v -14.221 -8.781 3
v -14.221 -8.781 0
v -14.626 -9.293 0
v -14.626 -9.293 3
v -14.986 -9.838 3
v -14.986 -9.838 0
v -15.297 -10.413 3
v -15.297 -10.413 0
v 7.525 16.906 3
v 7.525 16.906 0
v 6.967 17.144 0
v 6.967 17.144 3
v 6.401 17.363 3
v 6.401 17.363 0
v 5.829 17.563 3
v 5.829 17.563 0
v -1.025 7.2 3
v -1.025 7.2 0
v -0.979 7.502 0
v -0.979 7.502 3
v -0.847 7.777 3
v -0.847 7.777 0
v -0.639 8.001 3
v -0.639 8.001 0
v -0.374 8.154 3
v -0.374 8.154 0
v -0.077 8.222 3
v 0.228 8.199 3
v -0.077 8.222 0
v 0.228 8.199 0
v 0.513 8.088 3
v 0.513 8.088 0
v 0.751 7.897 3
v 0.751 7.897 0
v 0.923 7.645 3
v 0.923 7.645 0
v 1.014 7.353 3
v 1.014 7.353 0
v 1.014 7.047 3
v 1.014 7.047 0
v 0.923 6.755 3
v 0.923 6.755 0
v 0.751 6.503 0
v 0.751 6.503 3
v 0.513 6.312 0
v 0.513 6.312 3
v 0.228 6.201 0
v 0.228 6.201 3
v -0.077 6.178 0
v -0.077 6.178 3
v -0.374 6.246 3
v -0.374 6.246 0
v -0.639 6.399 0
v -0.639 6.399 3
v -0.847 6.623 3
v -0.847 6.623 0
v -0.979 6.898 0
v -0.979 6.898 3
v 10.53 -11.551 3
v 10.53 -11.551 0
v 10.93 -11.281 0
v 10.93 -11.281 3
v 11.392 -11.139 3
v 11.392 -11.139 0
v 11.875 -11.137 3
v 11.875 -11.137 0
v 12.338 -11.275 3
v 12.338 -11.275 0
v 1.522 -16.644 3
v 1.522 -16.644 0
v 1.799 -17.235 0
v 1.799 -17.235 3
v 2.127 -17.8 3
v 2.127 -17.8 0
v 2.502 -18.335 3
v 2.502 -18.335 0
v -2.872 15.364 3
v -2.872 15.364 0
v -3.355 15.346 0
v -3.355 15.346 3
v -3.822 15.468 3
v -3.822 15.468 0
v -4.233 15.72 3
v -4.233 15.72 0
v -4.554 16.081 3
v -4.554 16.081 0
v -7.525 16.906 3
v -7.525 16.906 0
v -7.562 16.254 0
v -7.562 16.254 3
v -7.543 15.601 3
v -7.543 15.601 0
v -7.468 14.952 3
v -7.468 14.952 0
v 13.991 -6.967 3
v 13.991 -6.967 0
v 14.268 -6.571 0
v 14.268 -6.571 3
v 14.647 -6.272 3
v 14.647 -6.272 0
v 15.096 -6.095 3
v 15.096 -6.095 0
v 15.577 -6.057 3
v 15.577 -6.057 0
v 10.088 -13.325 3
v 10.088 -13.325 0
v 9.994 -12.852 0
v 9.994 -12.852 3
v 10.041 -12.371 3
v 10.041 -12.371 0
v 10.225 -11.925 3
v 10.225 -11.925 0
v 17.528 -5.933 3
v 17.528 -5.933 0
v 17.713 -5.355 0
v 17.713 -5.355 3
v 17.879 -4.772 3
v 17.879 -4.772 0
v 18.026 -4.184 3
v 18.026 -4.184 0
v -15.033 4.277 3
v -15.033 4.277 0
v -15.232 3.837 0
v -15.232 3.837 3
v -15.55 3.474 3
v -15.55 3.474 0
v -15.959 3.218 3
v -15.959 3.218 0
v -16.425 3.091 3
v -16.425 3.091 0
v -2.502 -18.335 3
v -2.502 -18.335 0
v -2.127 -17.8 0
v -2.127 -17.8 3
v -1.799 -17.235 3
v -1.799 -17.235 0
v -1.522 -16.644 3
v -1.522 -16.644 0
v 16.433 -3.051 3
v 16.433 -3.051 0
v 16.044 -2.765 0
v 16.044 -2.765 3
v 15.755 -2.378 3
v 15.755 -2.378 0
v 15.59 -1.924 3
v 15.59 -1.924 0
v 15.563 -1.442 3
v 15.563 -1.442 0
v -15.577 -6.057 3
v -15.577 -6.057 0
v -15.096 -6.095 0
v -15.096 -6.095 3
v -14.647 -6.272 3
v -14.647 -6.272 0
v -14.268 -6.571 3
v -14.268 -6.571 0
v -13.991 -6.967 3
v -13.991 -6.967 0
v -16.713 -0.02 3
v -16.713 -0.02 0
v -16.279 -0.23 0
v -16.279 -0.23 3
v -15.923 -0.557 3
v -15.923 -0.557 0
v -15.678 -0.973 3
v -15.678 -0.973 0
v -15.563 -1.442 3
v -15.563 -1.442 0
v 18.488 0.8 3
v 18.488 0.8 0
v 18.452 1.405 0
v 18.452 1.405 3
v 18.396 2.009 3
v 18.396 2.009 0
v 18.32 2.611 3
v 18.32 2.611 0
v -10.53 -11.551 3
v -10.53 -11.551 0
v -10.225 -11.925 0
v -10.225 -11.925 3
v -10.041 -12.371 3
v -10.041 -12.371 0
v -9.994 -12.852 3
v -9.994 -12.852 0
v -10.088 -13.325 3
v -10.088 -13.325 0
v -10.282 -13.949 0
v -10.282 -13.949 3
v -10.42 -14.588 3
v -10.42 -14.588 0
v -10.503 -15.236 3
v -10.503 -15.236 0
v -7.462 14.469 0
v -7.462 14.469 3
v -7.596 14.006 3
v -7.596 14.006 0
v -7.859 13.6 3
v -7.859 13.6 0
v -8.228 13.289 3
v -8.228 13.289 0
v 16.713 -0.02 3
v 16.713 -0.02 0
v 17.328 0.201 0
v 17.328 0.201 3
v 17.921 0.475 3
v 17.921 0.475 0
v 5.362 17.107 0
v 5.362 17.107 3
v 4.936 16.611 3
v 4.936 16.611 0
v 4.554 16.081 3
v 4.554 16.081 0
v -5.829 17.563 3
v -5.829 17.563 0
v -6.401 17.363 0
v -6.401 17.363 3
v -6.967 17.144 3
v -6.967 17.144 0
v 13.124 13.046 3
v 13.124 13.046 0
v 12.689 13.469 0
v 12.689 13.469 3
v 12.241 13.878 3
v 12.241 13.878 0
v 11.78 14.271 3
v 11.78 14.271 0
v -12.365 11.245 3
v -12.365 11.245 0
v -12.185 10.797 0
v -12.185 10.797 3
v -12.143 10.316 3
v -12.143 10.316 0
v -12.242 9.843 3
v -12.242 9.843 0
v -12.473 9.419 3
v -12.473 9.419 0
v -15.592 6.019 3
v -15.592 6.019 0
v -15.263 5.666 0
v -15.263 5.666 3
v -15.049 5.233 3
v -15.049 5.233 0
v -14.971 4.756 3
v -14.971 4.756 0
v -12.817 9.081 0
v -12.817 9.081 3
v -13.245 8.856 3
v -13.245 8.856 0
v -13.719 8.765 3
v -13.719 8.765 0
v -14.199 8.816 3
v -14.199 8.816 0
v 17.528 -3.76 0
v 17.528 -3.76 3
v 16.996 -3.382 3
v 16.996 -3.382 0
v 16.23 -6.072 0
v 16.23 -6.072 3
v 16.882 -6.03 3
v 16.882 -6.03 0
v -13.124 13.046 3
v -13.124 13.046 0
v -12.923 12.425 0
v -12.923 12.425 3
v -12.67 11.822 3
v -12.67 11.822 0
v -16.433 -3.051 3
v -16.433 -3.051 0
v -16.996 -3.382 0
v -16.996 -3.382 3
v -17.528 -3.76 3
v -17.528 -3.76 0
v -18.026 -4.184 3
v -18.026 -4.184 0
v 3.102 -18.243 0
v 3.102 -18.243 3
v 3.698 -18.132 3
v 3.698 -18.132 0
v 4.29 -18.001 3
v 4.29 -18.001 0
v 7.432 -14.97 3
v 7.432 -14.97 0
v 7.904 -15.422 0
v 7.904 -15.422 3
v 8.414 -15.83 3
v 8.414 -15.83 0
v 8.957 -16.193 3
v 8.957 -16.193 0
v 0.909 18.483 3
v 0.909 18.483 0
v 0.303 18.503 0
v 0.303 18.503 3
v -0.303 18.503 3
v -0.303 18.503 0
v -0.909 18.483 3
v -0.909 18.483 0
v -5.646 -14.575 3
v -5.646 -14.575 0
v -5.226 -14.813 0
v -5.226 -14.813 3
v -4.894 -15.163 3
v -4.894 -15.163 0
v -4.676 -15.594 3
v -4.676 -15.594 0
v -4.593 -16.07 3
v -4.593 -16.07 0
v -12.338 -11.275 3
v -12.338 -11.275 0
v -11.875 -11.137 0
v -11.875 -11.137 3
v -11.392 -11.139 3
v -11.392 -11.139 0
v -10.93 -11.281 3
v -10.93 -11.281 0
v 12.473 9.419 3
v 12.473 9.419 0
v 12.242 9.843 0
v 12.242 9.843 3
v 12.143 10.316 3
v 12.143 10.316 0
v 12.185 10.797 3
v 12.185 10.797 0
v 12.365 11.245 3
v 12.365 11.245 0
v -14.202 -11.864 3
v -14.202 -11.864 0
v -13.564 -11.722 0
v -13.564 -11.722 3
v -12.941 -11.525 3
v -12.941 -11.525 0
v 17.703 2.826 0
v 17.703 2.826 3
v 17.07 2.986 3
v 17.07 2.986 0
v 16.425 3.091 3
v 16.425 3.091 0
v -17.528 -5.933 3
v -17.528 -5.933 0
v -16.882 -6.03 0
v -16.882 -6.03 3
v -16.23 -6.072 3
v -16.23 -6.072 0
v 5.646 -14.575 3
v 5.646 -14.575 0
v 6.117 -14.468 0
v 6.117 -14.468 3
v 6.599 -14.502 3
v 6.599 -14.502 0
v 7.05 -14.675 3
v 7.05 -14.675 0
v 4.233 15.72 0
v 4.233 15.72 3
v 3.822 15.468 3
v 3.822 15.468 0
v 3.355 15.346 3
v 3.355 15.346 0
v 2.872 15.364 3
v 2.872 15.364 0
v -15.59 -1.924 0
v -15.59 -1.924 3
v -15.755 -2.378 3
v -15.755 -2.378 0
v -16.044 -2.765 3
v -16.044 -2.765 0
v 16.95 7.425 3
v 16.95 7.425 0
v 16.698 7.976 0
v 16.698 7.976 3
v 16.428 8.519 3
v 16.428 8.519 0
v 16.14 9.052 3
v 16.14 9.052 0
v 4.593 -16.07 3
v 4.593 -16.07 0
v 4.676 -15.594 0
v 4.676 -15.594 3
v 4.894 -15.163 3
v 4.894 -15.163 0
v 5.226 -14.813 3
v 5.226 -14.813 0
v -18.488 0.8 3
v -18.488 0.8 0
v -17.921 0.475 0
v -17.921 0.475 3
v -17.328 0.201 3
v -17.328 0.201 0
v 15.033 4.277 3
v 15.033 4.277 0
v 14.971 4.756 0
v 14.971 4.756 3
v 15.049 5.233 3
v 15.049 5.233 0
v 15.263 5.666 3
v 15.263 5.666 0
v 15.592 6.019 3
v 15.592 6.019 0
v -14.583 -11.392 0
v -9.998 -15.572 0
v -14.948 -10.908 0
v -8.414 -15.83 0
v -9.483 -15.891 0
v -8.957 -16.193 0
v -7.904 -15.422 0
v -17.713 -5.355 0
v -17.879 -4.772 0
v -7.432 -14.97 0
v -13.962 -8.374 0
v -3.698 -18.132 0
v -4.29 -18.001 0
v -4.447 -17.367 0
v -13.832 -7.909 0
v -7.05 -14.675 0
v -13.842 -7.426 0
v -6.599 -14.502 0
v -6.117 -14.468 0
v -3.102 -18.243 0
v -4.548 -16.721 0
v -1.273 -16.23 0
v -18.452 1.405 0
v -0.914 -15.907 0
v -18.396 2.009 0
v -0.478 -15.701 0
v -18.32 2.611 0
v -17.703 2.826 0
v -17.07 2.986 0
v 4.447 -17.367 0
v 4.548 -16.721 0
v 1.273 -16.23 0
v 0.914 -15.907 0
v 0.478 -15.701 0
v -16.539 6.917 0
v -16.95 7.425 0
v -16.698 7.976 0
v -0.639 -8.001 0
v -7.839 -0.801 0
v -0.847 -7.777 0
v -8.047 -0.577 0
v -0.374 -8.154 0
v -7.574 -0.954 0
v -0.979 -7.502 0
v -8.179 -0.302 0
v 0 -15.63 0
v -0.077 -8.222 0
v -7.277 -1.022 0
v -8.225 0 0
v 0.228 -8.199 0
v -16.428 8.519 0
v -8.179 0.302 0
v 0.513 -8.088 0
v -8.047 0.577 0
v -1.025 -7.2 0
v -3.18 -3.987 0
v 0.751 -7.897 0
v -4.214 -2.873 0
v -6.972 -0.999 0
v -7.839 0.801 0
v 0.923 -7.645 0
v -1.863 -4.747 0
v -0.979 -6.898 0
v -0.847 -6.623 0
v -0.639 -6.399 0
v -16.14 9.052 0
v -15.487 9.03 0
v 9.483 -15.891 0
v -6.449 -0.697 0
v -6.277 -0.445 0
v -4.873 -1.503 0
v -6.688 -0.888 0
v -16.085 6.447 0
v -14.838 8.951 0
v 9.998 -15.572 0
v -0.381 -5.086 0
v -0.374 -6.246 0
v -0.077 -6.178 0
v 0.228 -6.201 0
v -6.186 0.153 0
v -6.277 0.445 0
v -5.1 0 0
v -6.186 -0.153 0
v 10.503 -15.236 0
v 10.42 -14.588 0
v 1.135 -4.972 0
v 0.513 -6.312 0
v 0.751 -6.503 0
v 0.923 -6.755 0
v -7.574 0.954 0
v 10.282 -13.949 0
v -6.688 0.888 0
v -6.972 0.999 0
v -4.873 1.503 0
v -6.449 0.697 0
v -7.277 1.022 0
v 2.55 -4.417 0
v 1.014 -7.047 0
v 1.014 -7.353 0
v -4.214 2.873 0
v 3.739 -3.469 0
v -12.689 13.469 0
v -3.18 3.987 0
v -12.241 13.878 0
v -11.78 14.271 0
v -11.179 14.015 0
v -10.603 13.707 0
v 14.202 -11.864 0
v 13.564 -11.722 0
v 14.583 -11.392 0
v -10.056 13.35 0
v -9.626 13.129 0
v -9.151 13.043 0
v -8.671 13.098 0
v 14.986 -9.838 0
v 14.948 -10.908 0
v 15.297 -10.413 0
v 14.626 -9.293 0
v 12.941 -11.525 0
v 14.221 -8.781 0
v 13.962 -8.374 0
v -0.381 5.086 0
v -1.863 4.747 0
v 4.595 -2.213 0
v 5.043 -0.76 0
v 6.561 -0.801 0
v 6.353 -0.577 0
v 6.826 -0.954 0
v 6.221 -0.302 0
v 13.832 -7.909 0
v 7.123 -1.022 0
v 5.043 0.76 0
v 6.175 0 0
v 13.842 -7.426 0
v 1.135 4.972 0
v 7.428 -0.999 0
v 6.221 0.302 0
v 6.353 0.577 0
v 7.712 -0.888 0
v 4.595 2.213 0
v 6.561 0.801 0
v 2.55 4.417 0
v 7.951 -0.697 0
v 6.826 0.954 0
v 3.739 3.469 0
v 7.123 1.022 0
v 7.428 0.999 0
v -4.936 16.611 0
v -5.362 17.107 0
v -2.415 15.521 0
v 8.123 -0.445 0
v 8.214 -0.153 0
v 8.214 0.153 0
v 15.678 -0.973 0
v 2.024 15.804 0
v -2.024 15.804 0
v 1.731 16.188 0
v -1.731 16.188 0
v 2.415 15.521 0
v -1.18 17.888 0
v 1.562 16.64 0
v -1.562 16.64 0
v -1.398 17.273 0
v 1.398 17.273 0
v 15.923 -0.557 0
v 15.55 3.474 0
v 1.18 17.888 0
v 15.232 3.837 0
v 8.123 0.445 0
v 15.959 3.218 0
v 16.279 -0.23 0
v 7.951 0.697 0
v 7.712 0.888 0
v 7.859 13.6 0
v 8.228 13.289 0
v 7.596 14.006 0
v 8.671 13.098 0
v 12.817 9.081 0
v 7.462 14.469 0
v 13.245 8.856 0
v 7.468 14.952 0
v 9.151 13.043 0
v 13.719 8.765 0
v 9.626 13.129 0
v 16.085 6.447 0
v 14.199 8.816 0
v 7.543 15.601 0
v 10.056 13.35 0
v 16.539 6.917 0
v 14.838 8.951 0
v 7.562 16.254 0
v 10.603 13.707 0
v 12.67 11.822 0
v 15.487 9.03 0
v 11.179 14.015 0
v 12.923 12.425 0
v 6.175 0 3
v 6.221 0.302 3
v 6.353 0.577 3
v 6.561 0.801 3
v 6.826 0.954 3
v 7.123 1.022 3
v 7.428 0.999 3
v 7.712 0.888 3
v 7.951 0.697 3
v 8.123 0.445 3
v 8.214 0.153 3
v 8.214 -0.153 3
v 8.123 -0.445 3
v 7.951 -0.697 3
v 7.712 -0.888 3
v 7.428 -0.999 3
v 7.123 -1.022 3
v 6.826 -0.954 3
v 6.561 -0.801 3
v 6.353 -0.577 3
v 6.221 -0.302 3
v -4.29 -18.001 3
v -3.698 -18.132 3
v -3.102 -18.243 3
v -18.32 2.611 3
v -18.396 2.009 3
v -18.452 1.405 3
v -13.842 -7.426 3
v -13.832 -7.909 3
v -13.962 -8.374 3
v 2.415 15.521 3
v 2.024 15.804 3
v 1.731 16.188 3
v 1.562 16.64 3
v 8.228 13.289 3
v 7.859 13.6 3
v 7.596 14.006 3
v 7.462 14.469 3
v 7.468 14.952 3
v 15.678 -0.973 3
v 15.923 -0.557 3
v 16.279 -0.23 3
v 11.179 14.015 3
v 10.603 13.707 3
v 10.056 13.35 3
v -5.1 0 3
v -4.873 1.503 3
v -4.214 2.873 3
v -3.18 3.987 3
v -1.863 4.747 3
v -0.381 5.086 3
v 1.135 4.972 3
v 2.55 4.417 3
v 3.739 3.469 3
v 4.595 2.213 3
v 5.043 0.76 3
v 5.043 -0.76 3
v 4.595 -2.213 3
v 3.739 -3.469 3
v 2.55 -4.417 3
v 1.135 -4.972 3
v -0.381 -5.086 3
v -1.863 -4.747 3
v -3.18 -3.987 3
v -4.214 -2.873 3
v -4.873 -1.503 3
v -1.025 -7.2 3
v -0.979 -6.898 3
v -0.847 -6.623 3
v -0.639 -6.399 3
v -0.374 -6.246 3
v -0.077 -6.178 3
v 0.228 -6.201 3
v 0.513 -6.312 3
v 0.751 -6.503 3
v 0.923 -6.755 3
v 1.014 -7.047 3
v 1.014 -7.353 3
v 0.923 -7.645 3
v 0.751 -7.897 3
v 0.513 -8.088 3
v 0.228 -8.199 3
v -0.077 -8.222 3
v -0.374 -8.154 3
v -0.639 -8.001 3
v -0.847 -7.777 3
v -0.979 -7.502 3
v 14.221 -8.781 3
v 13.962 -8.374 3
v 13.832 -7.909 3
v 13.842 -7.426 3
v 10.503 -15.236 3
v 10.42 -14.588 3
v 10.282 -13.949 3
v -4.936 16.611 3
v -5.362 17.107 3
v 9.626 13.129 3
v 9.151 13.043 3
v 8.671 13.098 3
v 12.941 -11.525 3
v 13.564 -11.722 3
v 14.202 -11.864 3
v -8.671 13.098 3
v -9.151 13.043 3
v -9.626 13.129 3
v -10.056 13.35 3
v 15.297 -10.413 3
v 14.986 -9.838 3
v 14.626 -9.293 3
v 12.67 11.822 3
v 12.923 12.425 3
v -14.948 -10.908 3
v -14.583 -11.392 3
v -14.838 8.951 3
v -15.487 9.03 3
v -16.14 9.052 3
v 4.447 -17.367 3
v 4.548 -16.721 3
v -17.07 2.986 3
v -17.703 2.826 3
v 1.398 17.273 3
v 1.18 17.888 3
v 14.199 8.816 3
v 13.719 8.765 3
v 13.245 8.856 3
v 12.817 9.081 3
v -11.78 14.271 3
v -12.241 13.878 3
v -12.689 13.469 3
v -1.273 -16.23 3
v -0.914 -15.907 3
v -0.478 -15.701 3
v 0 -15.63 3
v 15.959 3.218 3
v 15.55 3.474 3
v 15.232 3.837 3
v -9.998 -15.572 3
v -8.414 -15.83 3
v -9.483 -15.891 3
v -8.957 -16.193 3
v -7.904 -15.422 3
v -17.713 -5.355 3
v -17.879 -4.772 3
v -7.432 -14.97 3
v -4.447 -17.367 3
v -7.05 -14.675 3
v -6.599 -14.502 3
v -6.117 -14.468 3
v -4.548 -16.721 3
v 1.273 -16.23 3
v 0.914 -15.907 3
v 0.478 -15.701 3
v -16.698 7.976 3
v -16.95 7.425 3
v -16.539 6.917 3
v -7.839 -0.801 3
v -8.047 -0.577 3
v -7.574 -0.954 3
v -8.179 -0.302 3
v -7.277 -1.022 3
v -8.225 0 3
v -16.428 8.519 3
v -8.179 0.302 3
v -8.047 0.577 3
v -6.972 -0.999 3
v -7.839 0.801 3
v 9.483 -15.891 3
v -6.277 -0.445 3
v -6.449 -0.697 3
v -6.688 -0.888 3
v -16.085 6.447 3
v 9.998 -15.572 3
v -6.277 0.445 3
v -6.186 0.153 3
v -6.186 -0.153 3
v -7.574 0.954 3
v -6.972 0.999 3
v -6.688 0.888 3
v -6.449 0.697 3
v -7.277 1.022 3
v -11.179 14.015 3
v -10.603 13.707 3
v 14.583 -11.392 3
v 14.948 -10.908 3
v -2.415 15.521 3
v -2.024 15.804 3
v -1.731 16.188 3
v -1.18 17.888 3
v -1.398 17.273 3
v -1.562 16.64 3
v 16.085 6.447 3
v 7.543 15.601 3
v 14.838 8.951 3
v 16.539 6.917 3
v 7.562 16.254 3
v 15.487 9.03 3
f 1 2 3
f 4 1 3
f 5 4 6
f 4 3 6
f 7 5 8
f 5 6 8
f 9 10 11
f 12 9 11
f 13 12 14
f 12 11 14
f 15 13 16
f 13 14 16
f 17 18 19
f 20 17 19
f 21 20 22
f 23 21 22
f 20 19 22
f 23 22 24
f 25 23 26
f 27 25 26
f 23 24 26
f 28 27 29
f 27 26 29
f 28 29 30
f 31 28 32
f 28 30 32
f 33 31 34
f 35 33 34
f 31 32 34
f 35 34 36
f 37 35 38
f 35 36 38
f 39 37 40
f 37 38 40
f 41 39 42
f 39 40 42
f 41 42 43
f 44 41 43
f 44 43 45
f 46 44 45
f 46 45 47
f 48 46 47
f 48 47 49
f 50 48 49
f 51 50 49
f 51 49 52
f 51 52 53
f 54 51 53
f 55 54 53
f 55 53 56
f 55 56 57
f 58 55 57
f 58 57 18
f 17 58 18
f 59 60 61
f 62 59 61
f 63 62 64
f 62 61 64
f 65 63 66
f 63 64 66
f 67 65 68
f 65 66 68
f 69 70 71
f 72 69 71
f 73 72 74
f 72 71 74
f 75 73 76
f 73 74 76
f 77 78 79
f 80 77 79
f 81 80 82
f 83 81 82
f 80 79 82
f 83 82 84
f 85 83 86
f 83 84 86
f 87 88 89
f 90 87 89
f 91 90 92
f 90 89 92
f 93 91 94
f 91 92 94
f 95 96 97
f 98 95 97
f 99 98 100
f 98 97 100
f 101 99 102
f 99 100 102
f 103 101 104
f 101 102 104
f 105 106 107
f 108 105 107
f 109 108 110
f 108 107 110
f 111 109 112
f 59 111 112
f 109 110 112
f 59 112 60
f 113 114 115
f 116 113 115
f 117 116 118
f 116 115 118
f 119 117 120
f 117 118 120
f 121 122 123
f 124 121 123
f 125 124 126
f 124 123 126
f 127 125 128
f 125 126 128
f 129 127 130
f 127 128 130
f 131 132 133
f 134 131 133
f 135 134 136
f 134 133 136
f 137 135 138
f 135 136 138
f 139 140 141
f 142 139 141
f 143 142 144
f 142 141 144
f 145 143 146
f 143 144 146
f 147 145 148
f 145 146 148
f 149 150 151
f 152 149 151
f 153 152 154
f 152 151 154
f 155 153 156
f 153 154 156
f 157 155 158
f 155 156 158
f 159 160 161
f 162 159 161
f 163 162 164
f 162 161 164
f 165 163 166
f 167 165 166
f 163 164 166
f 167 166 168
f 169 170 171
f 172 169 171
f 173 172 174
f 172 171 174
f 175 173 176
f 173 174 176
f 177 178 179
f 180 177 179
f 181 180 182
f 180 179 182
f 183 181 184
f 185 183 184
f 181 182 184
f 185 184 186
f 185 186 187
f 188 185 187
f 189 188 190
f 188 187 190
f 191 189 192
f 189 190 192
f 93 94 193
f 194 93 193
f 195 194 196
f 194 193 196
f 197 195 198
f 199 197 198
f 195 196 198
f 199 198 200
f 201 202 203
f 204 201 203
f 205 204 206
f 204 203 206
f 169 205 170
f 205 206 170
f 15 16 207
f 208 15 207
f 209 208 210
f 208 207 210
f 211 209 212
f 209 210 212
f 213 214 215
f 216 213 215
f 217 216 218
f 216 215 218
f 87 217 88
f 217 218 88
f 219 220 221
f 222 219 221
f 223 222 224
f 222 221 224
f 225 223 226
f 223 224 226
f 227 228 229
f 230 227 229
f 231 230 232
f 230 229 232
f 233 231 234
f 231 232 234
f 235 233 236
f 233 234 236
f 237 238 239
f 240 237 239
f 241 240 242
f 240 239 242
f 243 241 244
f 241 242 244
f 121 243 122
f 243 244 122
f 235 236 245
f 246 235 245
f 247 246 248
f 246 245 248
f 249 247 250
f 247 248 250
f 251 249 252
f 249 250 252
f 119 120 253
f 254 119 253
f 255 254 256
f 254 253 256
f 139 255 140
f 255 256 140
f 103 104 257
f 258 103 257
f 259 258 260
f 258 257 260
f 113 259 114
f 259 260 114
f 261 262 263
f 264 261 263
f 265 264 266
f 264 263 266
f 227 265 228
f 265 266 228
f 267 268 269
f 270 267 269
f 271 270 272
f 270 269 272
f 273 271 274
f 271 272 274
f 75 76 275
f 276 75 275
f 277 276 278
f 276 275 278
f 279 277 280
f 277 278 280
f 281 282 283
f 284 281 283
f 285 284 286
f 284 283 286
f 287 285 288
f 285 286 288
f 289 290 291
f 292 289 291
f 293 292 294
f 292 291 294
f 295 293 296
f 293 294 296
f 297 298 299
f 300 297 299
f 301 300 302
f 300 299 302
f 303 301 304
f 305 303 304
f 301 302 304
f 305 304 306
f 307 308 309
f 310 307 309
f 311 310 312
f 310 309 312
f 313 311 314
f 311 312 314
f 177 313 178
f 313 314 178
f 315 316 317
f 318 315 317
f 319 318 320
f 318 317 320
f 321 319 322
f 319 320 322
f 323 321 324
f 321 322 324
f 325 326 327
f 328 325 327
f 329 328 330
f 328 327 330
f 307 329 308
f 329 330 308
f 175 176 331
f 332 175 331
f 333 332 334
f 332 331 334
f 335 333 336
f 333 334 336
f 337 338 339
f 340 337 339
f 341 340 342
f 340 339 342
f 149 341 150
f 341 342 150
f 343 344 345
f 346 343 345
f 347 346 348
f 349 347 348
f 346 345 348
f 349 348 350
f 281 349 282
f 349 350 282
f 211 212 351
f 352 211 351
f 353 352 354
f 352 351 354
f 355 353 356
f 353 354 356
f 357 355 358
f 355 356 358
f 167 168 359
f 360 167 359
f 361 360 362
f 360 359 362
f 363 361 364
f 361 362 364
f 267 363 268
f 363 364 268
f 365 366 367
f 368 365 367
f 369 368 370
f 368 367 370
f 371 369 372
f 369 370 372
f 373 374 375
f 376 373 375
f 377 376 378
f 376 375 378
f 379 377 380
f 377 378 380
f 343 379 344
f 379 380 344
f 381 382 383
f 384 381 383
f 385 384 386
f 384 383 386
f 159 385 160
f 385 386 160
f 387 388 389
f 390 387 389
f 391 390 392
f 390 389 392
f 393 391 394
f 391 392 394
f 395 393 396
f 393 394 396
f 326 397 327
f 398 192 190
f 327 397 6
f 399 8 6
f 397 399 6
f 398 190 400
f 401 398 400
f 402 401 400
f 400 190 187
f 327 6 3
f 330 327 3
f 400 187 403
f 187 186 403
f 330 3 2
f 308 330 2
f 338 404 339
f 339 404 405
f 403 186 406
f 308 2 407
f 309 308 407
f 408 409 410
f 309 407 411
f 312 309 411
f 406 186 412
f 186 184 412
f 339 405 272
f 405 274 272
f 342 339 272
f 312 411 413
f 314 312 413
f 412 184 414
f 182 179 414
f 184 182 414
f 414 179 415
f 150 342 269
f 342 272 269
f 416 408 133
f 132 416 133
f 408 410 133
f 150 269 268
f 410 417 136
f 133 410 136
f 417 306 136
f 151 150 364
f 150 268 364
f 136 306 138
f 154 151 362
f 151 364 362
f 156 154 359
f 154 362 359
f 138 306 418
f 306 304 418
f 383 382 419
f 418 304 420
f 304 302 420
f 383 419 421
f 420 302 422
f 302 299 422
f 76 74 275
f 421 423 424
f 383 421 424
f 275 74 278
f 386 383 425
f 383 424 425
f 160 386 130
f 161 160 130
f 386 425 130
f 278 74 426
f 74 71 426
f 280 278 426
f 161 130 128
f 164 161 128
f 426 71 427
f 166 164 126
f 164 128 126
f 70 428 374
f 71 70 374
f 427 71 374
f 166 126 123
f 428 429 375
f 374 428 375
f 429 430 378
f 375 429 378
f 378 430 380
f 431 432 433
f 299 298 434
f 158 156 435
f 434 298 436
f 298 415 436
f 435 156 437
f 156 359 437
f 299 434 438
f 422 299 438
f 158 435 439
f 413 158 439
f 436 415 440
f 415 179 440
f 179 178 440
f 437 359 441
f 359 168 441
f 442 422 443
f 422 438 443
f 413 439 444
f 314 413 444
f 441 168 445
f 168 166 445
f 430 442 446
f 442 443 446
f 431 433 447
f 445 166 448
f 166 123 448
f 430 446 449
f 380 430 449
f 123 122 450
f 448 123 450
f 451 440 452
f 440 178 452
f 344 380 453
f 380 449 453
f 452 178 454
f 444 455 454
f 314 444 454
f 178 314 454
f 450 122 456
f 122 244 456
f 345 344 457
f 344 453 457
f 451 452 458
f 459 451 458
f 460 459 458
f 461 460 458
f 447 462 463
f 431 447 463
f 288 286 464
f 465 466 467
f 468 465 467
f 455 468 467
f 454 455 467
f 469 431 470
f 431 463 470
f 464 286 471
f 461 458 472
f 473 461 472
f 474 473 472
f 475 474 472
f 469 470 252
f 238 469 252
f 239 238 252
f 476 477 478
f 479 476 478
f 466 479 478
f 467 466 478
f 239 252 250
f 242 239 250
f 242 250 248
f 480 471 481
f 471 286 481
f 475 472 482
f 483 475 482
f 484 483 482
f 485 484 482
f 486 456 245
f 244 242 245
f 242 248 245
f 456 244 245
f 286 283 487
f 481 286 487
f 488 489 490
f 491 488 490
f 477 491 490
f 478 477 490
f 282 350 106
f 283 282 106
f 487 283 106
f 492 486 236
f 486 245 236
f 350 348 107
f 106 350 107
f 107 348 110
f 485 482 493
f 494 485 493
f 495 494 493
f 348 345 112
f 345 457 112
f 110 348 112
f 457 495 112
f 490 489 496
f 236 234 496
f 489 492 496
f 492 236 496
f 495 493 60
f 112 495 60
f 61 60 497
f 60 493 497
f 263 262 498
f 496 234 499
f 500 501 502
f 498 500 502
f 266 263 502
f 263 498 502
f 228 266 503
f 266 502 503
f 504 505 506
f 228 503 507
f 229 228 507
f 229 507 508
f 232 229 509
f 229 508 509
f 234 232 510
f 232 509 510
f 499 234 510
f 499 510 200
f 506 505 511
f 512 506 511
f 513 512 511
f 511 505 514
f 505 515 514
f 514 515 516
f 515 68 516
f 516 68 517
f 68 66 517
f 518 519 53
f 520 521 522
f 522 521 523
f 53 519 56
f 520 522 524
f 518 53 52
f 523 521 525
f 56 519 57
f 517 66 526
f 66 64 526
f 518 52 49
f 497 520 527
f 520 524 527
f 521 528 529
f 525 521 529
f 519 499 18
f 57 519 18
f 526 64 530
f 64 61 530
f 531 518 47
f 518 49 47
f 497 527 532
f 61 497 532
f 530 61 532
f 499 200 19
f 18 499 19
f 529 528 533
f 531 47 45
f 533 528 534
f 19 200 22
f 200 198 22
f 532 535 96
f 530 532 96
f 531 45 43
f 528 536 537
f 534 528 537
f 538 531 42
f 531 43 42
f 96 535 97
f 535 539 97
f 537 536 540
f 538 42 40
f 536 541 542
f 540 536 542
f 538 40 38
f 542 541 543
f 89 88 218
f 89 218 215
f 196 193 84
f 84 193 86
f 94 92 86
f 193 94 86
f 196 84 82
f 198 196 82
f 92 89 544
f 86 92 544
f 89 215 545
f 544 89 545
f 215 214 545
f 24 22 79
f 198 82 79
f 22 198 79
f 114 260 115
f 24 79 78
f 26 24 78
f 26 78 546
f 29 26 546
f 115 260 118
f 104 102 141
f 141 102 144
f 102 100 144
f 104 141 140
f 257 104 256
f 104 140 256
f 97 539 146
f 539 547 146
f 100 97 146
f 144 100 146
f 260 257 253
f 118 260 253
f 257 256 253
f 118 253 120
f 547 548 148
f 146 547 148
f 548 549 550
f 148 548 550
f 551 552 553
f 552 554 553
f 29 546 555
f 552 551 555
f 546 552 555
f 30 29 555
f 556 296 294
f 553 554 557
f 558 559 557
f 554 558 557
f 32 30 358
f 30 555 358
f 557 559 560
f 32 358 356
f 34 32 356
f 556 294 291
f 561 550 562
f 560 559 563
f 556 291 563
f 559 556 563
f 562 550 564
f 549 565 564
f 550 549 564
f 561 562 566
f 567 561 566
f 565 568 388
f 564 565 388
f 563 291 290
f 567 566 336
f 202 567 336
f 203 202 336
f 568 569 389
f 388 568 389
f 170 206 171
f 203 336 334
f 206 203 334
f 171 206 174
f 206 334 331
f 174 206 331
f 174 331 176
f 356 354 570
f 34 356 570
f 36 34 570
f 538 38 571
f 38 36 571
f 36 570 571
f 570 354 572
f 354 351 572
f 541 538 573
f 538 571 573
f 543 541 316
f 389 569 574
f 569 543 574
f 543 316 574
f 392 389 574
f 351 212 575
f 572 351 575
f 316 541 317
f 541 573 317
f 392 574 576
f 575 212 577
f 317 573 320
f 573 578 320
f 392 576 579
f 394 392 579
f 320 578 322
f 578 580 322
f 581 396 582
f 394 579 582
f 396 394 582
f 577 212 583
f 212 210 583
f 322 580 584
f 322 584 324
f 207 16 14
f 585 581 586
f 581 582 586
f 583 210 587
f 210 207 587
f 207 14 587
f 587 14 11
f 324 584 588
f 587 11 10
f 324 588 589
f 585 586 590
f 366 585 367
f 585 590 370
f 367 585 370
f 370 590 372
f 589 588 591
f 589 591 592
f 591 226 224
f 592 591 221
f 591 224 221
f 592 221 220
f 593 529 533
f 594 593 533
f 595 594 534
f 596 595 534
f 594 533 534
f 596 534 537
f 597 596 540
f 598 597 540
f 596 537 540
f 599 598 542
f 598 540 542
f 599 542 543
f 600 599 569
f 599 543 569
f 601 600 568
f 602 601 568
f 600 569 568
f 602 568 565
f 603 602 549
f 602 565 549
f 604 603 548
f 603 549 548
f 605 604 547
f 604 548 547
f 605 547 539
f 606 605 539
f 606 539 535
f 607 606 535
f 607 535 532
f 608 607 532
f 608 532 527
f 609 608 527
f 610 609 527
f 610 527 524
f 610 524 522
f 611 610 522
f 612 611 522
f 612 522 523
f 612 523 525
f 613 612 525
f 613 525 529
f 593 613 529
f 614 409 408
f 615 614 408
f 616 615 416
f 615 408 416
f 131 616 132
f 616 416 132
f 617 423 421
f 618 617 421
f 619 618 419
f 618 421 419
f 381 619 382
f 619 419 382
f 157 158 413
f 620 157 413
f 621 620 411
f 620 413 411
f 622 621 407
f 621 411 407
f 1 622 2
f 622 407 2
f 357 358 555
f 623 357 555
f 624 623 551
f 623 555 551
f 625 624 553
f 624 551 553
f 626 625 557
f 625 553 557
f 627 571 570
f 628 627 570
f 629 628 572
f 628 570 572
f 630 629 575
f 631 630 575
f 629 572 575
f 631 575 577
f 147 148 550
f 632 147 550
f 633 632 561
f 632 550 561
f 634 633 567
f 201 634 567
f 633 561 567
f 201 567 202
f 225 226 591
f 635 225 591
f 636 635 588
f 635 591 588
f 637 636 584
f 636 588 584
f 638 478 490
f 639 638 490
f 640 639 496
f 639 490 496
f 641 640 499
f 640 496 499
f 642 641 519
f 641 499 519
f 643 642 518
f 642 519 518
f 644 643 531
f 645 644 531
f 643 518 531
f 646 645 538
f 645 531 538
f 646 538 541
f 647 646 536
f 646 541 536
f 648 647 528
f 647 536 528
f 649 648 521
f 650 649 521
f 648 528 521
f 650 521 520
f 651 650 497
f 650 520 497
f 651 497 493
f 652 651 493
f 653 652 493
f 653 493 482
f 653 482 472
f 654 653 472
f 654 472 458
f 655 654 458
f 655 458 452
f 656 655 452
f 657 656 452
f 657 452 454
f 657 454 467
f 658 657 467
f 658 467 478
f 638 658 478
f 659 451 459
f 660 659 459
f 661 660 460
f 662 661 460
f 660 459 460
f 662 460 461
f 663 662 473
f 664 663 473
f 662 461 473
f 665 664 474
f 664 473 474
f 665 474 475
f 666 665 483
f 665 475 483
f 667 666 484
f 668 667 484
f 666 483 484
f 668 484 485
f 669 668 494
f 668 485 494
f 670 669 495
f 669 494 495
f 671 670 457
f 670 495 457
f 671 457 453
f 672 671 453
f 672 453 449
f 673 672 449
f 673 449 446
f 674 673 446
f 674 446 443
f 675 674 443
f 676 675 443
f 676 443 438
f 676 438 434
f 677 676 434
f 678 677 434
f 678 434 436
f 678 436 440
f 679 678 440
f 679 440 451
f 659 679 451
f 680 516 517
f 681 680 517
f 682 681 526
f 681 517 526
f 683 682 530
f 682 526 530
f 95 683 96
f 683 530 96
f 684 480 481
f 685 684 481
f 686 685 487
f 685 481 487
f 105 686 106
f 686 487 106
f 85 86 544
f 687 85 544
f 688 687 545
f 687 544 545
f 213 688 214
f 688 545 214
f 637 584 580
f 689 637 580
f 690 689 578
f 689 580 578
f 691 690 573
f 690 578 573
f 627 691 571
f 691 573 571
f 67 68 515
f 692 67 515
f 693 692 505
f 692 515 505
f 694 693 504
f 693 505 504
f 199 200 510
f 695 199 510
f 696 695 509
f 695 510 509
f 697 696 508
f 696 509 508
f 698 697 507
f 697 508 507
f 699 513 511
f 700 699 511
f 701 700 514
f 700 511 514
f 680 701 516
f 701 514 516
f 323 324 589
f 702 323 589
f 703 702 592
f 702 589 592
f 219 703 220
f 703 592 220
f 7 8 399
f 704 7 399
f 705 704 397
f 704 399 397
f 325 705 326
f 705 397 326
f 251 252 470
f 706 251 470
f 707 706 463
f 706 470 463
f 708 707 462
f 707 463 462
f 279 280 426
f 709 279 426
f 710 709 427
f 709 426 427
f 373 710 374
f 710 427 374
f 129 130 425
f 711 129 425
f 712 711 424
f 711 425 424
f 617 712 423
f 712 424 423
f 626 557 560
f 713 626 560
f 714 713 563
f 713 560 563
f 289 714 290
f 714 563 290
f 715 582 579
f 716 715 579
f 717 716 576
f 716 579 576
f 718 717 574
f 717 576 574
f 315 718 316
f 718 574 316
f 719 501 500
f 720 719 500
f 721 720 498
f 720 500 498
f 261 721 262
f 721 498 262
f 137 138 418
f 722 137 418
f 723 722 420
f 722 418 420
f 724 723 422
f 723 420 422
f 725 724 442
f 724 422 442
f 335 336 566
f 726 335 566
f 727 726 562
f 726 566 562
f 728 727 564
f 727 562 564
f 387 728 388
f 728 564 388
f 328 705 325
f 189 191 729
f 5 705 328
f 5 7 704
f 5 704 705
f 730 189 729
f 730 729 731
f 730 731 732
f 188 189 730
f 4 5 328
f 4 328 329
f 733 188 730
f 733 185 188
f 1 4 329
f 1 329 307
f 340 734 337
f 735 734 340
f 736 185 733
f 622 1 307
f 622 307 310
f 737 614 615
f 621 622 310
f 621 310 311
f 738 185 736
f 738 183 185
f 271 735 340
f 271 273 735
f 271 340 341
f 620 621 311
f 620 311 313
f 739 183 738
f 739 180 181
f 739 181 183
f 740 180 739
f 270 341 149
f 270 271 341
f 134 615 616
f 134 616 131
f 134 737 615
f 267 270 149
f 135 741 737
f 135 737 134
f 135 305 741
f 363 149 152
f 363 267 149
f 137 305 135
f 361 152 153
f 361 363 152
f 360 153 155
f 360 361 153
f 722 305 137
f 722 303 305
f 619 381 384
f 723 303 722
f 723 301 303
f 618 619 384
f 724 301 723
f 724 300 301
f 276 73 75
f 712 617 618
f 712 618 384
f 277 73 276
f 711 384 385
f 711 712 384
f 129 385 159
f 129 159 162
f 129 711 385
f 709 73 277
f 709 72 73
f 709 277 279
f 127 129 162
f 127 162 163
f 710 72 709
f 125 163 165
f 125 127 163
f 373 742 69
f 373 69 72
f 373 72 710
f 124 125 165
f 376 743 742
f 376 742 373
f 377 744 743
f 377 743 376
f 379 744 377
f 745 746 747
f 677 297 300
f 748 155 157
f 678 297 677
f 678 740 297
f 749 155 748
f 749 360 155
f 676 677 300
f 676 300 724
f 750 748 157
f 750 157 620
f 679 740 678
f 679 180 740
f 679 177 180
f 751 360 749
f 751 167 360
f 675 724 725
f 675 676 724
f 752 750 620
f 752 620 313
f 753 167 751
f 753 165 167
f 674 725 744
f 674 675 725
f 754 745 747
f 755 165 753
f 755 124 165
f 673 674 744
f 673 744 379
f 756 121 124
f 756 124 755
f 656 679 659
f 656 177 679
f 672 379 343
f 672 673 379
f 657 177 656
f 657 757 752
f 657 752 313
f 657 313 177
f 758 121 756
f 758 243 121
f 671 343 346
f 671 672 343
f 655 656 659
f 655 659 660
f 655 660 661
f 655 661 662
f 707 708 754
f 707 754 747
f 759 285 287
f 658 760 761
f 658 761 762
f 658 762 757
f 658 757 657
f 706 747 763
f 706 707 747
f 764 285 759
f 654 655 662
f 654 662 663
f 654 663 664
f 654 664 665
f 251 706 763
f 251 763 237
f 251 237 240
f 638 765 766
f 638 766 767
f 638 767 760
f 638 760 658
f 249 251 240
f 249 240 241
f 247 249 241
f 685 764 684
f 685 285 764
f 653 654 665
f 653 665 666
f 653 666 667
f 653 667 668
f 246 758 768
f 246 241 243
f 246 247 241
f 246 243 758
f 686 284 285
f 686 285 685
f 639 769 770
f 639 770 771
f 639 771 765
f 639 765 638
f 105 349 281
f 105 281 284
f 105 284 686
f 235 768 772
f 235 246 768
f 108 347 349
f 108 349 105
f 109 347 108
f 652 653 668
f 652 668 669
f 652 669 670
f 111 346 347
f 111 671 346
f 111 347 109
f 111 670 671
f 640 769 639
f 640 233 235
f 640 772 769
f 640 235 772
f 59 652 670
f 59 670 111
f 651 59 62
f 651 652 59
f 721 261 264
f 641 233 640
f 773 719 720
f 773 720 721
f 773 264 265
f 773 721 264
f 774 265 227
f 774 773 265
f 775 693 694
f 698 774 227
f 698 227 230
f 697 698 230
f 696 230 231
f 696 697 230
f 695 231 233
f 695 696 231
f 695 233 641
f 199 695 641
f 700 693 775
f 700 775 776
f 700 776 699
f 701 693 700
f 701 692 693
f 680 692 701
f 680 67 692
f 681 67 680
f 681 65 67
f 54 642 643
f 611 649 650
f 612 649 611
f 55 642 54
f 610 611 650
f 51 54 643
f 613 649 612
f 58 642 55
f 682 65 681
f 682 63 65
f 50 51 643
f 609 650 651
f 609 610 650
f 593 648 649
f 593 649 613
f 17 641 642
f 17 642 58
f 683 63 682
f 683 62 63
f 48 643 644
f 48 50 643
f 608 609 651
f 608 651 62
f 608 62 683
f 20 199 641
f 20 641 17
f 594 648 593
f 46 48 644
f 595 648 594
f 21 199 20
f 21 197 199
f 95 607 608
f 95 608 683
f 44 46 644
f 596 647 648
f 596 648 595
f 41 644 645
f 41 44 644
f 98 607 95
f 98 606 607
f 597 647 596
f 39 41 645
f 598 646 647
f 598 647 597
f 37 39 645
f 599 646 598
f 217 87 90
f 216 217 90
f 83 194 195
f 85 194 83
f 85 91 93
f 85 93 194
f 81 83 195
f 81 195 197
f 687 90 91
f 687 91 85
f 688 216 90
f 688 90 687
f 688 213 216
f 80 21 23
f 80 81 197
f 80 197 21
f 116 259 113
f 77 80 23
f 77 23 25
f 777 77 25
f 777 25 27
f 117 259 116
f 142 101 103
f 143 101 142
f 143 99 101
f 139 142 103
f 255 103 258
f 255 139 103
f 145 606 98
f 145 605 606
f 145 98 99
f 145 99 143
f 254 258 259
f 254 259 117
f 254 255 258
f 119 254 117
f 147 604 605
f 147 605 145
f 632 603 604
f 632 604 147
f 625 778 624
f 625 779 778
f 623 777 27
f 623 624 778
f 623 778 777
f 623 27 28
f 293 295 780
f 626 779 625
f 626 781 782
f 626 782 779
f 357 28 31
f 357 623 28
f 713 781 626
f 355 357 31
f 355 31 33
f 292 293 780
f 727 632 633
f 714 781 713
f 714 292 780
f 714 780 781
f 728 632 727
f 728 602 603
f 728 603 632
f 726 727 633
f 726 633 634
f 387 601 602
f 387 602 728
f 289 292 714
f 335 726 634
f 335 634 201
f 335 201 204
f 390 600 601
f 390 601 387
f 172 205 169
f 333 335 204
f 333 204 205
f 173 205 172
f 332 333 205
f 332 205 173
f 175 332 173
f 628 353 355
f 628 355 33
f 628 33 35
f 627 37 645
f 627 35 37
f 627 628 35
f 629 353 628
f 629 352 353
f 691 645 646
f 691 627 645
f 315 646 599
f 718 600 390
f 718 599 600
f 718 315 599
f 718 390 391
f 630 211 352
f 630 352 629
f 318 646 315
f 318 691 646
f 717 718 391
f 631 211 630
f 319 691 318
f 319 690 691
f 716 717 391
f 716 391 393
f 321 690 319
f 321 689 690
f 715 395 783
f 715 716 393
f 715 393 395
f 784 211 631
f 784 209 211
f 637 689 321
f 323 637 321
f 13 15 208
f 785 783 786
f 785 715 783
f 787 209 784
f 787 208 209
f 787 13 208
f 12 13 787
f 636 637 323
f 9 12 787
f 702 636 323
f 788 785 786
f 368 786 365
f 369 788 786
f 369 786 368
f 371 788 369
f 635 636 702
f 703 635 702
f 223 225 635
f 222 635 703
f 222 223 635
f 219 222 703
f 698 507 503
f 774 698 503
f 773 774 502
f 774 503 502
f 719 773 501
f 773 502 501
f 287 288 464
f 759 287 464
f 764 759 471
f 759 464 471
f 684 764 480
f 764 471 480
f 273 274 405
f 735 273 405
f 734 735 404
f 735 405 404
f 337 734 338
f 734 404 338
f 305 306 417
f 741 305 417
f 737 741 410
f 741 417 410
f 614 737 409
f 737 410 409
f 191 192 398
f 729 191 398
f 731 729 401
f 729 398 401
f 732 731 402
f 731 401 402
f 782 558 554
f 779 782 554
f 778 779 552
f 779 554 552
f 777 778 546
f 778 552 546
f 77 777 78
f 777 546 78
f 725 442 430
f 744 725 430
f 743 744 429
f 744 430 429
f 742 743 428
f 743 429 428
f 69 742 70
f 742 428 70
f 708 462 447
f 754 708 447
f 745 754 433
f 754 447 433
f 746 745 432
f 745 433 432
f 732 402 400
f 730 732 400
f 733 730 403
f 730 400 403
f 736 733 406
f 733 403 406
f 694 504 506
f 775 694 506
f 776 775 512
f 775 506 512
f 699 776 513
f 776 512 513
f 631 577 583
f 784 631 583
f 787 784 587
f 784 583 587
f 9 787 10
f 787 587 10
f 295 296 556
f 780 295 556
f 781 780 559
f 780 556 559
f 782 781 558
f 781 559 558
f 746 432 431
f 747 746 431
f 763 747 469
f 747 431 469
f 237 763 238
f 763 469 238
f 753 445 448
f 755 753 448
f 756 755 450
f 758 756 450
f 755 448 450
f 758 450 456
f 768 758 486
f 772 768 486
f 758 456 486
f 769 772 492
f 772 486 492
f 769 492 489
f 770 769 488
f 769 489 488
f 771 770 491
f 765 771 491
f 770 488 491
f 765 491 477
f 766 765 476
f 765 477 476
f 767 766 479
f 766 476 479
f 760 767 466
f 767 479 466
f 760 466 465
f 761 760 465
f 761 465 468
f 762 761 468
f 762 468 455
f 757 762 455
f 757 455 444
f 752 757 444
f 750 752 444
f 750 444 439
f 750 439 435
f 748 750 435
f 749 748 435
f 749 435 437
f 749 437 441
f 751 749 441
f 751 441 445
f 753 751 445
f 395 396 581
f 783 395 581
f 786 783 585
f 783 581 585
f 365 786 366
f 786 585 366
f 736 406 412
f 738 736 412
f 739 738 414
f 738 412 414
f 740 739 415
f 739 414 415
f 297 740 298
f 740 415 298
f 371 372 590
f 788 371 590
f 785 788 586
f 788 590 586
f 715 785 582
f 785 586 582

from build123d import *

# Parameters (mm, degrees)
EXTRUDE_2_DEPTH      = 3
HOLE_WIZARD_M2_5_1_D = 2.05
SKETCH_4_R           = 5.1
CUT_EXTRUDE_1_DEPTH  = 10


with BuildPart() as part:
    # 草图1 → 凸台-拉伸2 (new body)
    with BuildSketch(Plane.XY):
        with BuildLine():
            ThreePointArc((-11.779760181, 14.271379579), (-12.466737886, 13.675360013), (-13.123601243, 13.046306581))
            ThreePointArc((-13.123601243, 13.046306581), (-12.803108373, 12.120767872), (-12.365117817, 11.24469604))
            ThreePointArc((-12.365117817, 11.24469604), (-12.142820781, 10.31561124), (-12.473009262, 9.419179367))
            ThreePointArc((-12.473009262, 9.419179367), (-13.244860059, 8.856275392), (-14.199312115, 8.815830257))
            ThreePointArc((-14.199312115, 8.815830257), (-15.161802274, 8.997352368), (-16.139716175, 9.052324938))
            ThreePointArc((-16.139716175, 9.052324938), (-16.564996707, 8.248388274), (-16.950263236, 7.424527004))
            ThreePointArc((-16.950263236, 7.424527004), (-16.317069389, 6.677263239), (-15.592181711, 6.018571022))
            ThreePointArc((-15.592181711, 6.018571022), (-15.049271757, 5.2325282), (-15.033334803, 4.277352535))
            ThreePointArc((-15.033334803, 4.277352535), (-15.549719866, 3.473635543), (-16.425109435, 3.091133726))
            ThreePointArc((-16.425109435, 3.091133726), (-17.388178129, 2.912706505), (-18.319914067, 2.610703653))
            ThreePointArc((-18.319914067, 2.610703653), (-18.426060932, 1.707425992), (-18.487698254, 0.800023914))
            ThreePointArc((-18.487698254, 0.800023914), (-17.627319769, 0.331957205), (-16.713435066, -0.020395362))
            ThreePointArc((-16.713435066, -0.020395362), (-15.923235192, -0.557236769), (-15.563325175, -1.442154458))
            ThreePointArc((-15.563325175, -1.442154458), (-15.754503841, -2.378138035), (-16.432604711, -3.051037542))
            ThreePointArc((-16.432604711, -3.051037542), (-17.266184176, -3.565316511), (-18.02590605, -4.183507626))
            ThreePointArc((-18.02590605, -4.183507626), (-17.798583527, -5.064133631), (-17.528267179, -5.932526839))
            ThreePointArc((-17.528267179, -5.932526839), (-16.556902937, -6.058181489), (-15.577446402, -6.056607239))
            ThreePointArc((-15.577446402, -6.056607239), (-14.64667748, -6.271743824), (-13.991402244, -6.966890501))
            ThreePointArc((-13.991402244, -6.966890501), (-13.831554774, -7.908730892), (-14.220785664, -8.781149285))
            ThreePointArc((-14.220785664, -8.781149285), (-14.812296375, -9.561823776), (-15.297399536, -10.412713019))
            ThreePointArc((-15.297399536, -10.412713019), (-14.767308791, -11.151753946), (-14.201546494, -11.863856968))
            ThreePointArc((-14.201546494, -11.863856968), (-13.250384619, -11.630129203), (-12.337637284, -11.274840748))
            ThreePointArc((-12.337637284, -11.274840748), (-11.392004814, -11.139217123), (-10.52986291, -11.550709376))
            ThreePointArc((-10.52986291, -11.550709376), (-10.040577591, -12.371205819), (-10.088370713, -13.325318158))
            ThreePointArc((-10.088370713, -13.325318158), (-10.357925871, -14.266953756), (-10.502894449, -15.23562382))
            ThreePointArc((-10.502894449, -15.23562382), (-9.741627174, -15.733268097), (-8.956828262, -16.192907475))
            ThreePointArc((-8.956828262, -16.192907475), (-8.154328435, -15.631363523), (-7.431561886, -14.970344538))
            ThreePointArc((-7.431561886, -14.970344538), (-6.598778773, -14.502277424), (-5.646207243, -14.574540946))
            ThreePointArc((-5.646207243, -14.574540946), (-4.893564768, -15.162880849), (-4.593465396, -16.069828976))
            ThreePointArc((-4.593465396, -16.069828976), (-4.504660083, -17.045252575), (-4.289915268, -18.000879201))
            ThreePointArc((-4.289915268, -18.000879201), (-3.400284827, -18.18991721), (-2.502440741, -18.335016099))
            ThreePointArc((-2.502440741, -18.335016099), (-1.956985011, -17.521495584), (-1.521812876, -16.644020345))
            ThreePointArc((-1.521812876, -16.644020345), (-0.914351093, -15.9067248), (0, -15.63))
            ThreePointArc((0, -15.63), (0.914351093, -15.9067248), (1.521812876, -16.644020345))
            ThreePointArc((1.521812876, -16.644020345), (1.956985011, -17.521495584), (2.502440741, -18.335016099))
            ThreePointArc((2.502440741, -18.335016099), (3.400284827, -18.18991721), (4.289915268, -18.000879201))
            ThreePointArc((4.289915268, -18.000879201), (4.504660083, -17.045252575), (4.593465396, -16.069828976))
            ThreePointArc((4.593465396, -16.069828976), (4.893564768, -15.162880849), (5.646207243, -14.574540946))
            ThreePointArc((5.646207243, -14.574540946), (6.598778773, -14.502277424), (7.431561886, -14.970344538))
            ThreePointArc((7.431561886, -14.970344538), (8.154328435, -15.631363523), (8.956828262, -16.192907475))
            ThreePointArc((8.956828262, -16.192907475), (9.741627174, -15.733268097), (10.502894449, -15.23562382))
            ThreePointArc((10.502894449, -15.23562382), (10.357925871, -14.266953756), (10.088370713, -13.325318158))
            ThreePointArc((10.088370713, -13.325318158), (10.040577591, -12.371205819), (10.52986291, -11.550709376))
            ThreePointArc((10.52986291, -11.550709376), (11.392004814, -11.139217123), (12.337637284, -11.274840748))
            ThreePointArc((12.337637284, -11.274840748), (13.250384619, -11.630129203), (14.201546494, -11.863856968))
            ThreePointArc((14.201546494, -11.863856968), (14.767308791, -11.151753946), (15.297399536, -10.412713019))
            ThreePointArc((15.297399536, -10.412713019), (14.812296375, -9.561823776), (14.220785664, -8.781149285))
            ThreePointArc((14.220785664, -8.781149285), (13.831554774, -7.908730892), (13.991402244, -6.966890501))
            ThreePointArc((13.991402244, -6.966890501), (14.64667748, -6.271743824), (15.577446402, -6.056607239))
            ThreePointArc((15.577446402, -6.056607239), (16.556902937, -6.058181489), (17.528267179, -5.932526839))
            ThreePointArc((17.528267179, -5.932526839), (17.798583527, -5.064133631), (18.02590605, -4.183507626))
            ThreePointArc((18.02590605, -4.183507626), (17.266184176, -3.565316511), (16.432604711, -3.051037542))
            ThreePointArc((16.432604711, -3.051037542), (15.754503841, -2.378138035), (15.563325175, -1.442154458))
            ThreePointArc((15.563325175, -1.442154458), (15.923235192, -0.557236769), (16.713435066, -0.020395362))
            ThreePointArc((16.713435066, -0.020395362), (17.627319769, 0.331957205), (18.487698254, 0.800023914))
            ThreePointArc((18.487698254, 0.800023914), (18.426060932, 1.707425992), (18.319914067, 2.610703653))
            ThreePointArc((18.319914067, 2.610703653), (17.388178129, 2.912706505), (16.425109435, 3.091133726))
            ThreePointArc((16.425109435, 3.091133726), (15.549719866, 3.473635543), (15.033334803, 4.277352535))
            ThreePointArc((15.033334803, 4.277352535), (15.049271757, 5.2325282), (15.592181711, 6.018571022))
            ThreePointArc((15.592181711, 6.018571022), (16.317069389, 6.677263239), (16.950263236, 7.424527004))
            ThreePointArc((16.950263236, 7.424527004), (16.564996707, 8.248388274), (16.139716175, 9.052324938))
            ThreePointArc((16.139716175, 9.052324938), (15.161802274, 8.997352368), (14.199312115, 8.815830257))
            ThreePointArc((14.199312115, 8.815830257), (13.244860059, 8.856275392), (12.473009262, 9.419179367))
            ThreePointArc((12.473009262, 9.419179367), (12.142820781, 10.31561124), (12.365117817, 11.24469604))
            ThreePointArc((12.365117817, 11.24469604), (12.803108373, 12.120767872), (13.123601243, 13.046306581))
            ThreePointArc((13.123601243, 13.046306581), (12.466737886, 13.675360013), (11.779760181, 14.271379579))
            ThreePointArc((11.779760181, 14.271379579), (10.887741008, 13.866855937), (10.055819013, 13.349900061))
            ThreePointArc((10.055819013, 13.349900061), (9.151208508, 13.042826175), (8.228134706, 13.288893831))
            ThreePointArc((8.228134706, 13.288893831), (7.596414573, 14.005513822), (7.468076245, 14.952162548))
            ThreePointArc((7.468076245, 14.952162548), (7.560016626, 15.927295641), (7.524524182, 16.906110163))
            ThreePointArc((7.524524182, 16.906110163), (6.684777033, 17.255398605), (5.8288823, 17.563005328))
            ThreePointArc((5.8288823, 17.563005328), (5.143229987, 16.863563773), (4.554231832, 16.080991887))
            ThreePointArc((4.554231832, 16.080991887), (3.821635541, 15.46787101), (2.872004963, 15.363869548))
            ThreePointArc((2.872004963, 15.363869548), (2.024070484, 15.803894155), (1.562429593, 16.640256651))
            ThreePointArc((1.562429593, 16.640256651), (1.295902743, 17.582753877), (0.909218435, 18.482649887))
            ThreePointArc((0.909218435, 18.482649887), (0, 18.505), (-0.909218435, 18.482649887))
            ThreePointArc((-0.909218435, 18.482649887), (-1.295902743, 17.582753877), (-1.562429593, 16.640256651))
            ThreePointArc((-1.562429593, 16.640256651), (-2.024070484, 15.803894155), (-2.872004963, 15.363869548))
            ThreePointArc((-2.872004963, 15.363869548), (-3.821635541, 15.46787101), (-4.554231832, 16.080991887))
            ThreePointArc((-4.554231832, 16.080991887), (-5.143229987, 16.863563773), (-5.8288823, 17.563005328))
            ThreePointArc((-5.8288823, 17.563005328), (-6.684777033, 17.255398605), (-7.524524182, 16.906110163))
            ThreePointArc((-7.524524182, 16.906110163), (-7.560016626, 15.927295641), (-7.468076245, 14.952162548))
            ThreePointArc((-7.468076245, 14.952162548), (-7.596414573, 14.005513822), (-8.228134706, 13.288893831))
            ThreePointArc((-8.228134706, 13.288893831), (-9.151208508, 13.042826175), (-10.055819013, 13.349900061))
            ThreePointArc((-10.055819013, 13.349900061), (-10.887741008, 13.866855937), (-11.779760181, 14.271379579))
        make_face()
    extrude(amount=EXTRUDE_2_DEPTH)

    # M2.5 螺纹孔1 (through all)
    with Locations(Plane(origin=(0, 7.2, 3), x_dir=(1, 0, 0), z_dir=(0, 0, 1))):
        with Locations((0, 0), (7.2, -7.2), (0, -14.4), (-7.2, -7.2)):
            Hole(HOLE_WIZARD_M2_5_1_D / 2)

    # 草图4 → 切除-拉伸1 (cut)
    with BuildSketch(Plane(origin=(0, 0, 0), x_dir=(-1, 0, 0), z_dir=(0, 0, -1))):
        Circle(SKETCH_4_R)
    extrude(amount=-CUT_EXTRUDE_1_DEPTH, mode=Mode.SUBTRACT)


solid = part.part
